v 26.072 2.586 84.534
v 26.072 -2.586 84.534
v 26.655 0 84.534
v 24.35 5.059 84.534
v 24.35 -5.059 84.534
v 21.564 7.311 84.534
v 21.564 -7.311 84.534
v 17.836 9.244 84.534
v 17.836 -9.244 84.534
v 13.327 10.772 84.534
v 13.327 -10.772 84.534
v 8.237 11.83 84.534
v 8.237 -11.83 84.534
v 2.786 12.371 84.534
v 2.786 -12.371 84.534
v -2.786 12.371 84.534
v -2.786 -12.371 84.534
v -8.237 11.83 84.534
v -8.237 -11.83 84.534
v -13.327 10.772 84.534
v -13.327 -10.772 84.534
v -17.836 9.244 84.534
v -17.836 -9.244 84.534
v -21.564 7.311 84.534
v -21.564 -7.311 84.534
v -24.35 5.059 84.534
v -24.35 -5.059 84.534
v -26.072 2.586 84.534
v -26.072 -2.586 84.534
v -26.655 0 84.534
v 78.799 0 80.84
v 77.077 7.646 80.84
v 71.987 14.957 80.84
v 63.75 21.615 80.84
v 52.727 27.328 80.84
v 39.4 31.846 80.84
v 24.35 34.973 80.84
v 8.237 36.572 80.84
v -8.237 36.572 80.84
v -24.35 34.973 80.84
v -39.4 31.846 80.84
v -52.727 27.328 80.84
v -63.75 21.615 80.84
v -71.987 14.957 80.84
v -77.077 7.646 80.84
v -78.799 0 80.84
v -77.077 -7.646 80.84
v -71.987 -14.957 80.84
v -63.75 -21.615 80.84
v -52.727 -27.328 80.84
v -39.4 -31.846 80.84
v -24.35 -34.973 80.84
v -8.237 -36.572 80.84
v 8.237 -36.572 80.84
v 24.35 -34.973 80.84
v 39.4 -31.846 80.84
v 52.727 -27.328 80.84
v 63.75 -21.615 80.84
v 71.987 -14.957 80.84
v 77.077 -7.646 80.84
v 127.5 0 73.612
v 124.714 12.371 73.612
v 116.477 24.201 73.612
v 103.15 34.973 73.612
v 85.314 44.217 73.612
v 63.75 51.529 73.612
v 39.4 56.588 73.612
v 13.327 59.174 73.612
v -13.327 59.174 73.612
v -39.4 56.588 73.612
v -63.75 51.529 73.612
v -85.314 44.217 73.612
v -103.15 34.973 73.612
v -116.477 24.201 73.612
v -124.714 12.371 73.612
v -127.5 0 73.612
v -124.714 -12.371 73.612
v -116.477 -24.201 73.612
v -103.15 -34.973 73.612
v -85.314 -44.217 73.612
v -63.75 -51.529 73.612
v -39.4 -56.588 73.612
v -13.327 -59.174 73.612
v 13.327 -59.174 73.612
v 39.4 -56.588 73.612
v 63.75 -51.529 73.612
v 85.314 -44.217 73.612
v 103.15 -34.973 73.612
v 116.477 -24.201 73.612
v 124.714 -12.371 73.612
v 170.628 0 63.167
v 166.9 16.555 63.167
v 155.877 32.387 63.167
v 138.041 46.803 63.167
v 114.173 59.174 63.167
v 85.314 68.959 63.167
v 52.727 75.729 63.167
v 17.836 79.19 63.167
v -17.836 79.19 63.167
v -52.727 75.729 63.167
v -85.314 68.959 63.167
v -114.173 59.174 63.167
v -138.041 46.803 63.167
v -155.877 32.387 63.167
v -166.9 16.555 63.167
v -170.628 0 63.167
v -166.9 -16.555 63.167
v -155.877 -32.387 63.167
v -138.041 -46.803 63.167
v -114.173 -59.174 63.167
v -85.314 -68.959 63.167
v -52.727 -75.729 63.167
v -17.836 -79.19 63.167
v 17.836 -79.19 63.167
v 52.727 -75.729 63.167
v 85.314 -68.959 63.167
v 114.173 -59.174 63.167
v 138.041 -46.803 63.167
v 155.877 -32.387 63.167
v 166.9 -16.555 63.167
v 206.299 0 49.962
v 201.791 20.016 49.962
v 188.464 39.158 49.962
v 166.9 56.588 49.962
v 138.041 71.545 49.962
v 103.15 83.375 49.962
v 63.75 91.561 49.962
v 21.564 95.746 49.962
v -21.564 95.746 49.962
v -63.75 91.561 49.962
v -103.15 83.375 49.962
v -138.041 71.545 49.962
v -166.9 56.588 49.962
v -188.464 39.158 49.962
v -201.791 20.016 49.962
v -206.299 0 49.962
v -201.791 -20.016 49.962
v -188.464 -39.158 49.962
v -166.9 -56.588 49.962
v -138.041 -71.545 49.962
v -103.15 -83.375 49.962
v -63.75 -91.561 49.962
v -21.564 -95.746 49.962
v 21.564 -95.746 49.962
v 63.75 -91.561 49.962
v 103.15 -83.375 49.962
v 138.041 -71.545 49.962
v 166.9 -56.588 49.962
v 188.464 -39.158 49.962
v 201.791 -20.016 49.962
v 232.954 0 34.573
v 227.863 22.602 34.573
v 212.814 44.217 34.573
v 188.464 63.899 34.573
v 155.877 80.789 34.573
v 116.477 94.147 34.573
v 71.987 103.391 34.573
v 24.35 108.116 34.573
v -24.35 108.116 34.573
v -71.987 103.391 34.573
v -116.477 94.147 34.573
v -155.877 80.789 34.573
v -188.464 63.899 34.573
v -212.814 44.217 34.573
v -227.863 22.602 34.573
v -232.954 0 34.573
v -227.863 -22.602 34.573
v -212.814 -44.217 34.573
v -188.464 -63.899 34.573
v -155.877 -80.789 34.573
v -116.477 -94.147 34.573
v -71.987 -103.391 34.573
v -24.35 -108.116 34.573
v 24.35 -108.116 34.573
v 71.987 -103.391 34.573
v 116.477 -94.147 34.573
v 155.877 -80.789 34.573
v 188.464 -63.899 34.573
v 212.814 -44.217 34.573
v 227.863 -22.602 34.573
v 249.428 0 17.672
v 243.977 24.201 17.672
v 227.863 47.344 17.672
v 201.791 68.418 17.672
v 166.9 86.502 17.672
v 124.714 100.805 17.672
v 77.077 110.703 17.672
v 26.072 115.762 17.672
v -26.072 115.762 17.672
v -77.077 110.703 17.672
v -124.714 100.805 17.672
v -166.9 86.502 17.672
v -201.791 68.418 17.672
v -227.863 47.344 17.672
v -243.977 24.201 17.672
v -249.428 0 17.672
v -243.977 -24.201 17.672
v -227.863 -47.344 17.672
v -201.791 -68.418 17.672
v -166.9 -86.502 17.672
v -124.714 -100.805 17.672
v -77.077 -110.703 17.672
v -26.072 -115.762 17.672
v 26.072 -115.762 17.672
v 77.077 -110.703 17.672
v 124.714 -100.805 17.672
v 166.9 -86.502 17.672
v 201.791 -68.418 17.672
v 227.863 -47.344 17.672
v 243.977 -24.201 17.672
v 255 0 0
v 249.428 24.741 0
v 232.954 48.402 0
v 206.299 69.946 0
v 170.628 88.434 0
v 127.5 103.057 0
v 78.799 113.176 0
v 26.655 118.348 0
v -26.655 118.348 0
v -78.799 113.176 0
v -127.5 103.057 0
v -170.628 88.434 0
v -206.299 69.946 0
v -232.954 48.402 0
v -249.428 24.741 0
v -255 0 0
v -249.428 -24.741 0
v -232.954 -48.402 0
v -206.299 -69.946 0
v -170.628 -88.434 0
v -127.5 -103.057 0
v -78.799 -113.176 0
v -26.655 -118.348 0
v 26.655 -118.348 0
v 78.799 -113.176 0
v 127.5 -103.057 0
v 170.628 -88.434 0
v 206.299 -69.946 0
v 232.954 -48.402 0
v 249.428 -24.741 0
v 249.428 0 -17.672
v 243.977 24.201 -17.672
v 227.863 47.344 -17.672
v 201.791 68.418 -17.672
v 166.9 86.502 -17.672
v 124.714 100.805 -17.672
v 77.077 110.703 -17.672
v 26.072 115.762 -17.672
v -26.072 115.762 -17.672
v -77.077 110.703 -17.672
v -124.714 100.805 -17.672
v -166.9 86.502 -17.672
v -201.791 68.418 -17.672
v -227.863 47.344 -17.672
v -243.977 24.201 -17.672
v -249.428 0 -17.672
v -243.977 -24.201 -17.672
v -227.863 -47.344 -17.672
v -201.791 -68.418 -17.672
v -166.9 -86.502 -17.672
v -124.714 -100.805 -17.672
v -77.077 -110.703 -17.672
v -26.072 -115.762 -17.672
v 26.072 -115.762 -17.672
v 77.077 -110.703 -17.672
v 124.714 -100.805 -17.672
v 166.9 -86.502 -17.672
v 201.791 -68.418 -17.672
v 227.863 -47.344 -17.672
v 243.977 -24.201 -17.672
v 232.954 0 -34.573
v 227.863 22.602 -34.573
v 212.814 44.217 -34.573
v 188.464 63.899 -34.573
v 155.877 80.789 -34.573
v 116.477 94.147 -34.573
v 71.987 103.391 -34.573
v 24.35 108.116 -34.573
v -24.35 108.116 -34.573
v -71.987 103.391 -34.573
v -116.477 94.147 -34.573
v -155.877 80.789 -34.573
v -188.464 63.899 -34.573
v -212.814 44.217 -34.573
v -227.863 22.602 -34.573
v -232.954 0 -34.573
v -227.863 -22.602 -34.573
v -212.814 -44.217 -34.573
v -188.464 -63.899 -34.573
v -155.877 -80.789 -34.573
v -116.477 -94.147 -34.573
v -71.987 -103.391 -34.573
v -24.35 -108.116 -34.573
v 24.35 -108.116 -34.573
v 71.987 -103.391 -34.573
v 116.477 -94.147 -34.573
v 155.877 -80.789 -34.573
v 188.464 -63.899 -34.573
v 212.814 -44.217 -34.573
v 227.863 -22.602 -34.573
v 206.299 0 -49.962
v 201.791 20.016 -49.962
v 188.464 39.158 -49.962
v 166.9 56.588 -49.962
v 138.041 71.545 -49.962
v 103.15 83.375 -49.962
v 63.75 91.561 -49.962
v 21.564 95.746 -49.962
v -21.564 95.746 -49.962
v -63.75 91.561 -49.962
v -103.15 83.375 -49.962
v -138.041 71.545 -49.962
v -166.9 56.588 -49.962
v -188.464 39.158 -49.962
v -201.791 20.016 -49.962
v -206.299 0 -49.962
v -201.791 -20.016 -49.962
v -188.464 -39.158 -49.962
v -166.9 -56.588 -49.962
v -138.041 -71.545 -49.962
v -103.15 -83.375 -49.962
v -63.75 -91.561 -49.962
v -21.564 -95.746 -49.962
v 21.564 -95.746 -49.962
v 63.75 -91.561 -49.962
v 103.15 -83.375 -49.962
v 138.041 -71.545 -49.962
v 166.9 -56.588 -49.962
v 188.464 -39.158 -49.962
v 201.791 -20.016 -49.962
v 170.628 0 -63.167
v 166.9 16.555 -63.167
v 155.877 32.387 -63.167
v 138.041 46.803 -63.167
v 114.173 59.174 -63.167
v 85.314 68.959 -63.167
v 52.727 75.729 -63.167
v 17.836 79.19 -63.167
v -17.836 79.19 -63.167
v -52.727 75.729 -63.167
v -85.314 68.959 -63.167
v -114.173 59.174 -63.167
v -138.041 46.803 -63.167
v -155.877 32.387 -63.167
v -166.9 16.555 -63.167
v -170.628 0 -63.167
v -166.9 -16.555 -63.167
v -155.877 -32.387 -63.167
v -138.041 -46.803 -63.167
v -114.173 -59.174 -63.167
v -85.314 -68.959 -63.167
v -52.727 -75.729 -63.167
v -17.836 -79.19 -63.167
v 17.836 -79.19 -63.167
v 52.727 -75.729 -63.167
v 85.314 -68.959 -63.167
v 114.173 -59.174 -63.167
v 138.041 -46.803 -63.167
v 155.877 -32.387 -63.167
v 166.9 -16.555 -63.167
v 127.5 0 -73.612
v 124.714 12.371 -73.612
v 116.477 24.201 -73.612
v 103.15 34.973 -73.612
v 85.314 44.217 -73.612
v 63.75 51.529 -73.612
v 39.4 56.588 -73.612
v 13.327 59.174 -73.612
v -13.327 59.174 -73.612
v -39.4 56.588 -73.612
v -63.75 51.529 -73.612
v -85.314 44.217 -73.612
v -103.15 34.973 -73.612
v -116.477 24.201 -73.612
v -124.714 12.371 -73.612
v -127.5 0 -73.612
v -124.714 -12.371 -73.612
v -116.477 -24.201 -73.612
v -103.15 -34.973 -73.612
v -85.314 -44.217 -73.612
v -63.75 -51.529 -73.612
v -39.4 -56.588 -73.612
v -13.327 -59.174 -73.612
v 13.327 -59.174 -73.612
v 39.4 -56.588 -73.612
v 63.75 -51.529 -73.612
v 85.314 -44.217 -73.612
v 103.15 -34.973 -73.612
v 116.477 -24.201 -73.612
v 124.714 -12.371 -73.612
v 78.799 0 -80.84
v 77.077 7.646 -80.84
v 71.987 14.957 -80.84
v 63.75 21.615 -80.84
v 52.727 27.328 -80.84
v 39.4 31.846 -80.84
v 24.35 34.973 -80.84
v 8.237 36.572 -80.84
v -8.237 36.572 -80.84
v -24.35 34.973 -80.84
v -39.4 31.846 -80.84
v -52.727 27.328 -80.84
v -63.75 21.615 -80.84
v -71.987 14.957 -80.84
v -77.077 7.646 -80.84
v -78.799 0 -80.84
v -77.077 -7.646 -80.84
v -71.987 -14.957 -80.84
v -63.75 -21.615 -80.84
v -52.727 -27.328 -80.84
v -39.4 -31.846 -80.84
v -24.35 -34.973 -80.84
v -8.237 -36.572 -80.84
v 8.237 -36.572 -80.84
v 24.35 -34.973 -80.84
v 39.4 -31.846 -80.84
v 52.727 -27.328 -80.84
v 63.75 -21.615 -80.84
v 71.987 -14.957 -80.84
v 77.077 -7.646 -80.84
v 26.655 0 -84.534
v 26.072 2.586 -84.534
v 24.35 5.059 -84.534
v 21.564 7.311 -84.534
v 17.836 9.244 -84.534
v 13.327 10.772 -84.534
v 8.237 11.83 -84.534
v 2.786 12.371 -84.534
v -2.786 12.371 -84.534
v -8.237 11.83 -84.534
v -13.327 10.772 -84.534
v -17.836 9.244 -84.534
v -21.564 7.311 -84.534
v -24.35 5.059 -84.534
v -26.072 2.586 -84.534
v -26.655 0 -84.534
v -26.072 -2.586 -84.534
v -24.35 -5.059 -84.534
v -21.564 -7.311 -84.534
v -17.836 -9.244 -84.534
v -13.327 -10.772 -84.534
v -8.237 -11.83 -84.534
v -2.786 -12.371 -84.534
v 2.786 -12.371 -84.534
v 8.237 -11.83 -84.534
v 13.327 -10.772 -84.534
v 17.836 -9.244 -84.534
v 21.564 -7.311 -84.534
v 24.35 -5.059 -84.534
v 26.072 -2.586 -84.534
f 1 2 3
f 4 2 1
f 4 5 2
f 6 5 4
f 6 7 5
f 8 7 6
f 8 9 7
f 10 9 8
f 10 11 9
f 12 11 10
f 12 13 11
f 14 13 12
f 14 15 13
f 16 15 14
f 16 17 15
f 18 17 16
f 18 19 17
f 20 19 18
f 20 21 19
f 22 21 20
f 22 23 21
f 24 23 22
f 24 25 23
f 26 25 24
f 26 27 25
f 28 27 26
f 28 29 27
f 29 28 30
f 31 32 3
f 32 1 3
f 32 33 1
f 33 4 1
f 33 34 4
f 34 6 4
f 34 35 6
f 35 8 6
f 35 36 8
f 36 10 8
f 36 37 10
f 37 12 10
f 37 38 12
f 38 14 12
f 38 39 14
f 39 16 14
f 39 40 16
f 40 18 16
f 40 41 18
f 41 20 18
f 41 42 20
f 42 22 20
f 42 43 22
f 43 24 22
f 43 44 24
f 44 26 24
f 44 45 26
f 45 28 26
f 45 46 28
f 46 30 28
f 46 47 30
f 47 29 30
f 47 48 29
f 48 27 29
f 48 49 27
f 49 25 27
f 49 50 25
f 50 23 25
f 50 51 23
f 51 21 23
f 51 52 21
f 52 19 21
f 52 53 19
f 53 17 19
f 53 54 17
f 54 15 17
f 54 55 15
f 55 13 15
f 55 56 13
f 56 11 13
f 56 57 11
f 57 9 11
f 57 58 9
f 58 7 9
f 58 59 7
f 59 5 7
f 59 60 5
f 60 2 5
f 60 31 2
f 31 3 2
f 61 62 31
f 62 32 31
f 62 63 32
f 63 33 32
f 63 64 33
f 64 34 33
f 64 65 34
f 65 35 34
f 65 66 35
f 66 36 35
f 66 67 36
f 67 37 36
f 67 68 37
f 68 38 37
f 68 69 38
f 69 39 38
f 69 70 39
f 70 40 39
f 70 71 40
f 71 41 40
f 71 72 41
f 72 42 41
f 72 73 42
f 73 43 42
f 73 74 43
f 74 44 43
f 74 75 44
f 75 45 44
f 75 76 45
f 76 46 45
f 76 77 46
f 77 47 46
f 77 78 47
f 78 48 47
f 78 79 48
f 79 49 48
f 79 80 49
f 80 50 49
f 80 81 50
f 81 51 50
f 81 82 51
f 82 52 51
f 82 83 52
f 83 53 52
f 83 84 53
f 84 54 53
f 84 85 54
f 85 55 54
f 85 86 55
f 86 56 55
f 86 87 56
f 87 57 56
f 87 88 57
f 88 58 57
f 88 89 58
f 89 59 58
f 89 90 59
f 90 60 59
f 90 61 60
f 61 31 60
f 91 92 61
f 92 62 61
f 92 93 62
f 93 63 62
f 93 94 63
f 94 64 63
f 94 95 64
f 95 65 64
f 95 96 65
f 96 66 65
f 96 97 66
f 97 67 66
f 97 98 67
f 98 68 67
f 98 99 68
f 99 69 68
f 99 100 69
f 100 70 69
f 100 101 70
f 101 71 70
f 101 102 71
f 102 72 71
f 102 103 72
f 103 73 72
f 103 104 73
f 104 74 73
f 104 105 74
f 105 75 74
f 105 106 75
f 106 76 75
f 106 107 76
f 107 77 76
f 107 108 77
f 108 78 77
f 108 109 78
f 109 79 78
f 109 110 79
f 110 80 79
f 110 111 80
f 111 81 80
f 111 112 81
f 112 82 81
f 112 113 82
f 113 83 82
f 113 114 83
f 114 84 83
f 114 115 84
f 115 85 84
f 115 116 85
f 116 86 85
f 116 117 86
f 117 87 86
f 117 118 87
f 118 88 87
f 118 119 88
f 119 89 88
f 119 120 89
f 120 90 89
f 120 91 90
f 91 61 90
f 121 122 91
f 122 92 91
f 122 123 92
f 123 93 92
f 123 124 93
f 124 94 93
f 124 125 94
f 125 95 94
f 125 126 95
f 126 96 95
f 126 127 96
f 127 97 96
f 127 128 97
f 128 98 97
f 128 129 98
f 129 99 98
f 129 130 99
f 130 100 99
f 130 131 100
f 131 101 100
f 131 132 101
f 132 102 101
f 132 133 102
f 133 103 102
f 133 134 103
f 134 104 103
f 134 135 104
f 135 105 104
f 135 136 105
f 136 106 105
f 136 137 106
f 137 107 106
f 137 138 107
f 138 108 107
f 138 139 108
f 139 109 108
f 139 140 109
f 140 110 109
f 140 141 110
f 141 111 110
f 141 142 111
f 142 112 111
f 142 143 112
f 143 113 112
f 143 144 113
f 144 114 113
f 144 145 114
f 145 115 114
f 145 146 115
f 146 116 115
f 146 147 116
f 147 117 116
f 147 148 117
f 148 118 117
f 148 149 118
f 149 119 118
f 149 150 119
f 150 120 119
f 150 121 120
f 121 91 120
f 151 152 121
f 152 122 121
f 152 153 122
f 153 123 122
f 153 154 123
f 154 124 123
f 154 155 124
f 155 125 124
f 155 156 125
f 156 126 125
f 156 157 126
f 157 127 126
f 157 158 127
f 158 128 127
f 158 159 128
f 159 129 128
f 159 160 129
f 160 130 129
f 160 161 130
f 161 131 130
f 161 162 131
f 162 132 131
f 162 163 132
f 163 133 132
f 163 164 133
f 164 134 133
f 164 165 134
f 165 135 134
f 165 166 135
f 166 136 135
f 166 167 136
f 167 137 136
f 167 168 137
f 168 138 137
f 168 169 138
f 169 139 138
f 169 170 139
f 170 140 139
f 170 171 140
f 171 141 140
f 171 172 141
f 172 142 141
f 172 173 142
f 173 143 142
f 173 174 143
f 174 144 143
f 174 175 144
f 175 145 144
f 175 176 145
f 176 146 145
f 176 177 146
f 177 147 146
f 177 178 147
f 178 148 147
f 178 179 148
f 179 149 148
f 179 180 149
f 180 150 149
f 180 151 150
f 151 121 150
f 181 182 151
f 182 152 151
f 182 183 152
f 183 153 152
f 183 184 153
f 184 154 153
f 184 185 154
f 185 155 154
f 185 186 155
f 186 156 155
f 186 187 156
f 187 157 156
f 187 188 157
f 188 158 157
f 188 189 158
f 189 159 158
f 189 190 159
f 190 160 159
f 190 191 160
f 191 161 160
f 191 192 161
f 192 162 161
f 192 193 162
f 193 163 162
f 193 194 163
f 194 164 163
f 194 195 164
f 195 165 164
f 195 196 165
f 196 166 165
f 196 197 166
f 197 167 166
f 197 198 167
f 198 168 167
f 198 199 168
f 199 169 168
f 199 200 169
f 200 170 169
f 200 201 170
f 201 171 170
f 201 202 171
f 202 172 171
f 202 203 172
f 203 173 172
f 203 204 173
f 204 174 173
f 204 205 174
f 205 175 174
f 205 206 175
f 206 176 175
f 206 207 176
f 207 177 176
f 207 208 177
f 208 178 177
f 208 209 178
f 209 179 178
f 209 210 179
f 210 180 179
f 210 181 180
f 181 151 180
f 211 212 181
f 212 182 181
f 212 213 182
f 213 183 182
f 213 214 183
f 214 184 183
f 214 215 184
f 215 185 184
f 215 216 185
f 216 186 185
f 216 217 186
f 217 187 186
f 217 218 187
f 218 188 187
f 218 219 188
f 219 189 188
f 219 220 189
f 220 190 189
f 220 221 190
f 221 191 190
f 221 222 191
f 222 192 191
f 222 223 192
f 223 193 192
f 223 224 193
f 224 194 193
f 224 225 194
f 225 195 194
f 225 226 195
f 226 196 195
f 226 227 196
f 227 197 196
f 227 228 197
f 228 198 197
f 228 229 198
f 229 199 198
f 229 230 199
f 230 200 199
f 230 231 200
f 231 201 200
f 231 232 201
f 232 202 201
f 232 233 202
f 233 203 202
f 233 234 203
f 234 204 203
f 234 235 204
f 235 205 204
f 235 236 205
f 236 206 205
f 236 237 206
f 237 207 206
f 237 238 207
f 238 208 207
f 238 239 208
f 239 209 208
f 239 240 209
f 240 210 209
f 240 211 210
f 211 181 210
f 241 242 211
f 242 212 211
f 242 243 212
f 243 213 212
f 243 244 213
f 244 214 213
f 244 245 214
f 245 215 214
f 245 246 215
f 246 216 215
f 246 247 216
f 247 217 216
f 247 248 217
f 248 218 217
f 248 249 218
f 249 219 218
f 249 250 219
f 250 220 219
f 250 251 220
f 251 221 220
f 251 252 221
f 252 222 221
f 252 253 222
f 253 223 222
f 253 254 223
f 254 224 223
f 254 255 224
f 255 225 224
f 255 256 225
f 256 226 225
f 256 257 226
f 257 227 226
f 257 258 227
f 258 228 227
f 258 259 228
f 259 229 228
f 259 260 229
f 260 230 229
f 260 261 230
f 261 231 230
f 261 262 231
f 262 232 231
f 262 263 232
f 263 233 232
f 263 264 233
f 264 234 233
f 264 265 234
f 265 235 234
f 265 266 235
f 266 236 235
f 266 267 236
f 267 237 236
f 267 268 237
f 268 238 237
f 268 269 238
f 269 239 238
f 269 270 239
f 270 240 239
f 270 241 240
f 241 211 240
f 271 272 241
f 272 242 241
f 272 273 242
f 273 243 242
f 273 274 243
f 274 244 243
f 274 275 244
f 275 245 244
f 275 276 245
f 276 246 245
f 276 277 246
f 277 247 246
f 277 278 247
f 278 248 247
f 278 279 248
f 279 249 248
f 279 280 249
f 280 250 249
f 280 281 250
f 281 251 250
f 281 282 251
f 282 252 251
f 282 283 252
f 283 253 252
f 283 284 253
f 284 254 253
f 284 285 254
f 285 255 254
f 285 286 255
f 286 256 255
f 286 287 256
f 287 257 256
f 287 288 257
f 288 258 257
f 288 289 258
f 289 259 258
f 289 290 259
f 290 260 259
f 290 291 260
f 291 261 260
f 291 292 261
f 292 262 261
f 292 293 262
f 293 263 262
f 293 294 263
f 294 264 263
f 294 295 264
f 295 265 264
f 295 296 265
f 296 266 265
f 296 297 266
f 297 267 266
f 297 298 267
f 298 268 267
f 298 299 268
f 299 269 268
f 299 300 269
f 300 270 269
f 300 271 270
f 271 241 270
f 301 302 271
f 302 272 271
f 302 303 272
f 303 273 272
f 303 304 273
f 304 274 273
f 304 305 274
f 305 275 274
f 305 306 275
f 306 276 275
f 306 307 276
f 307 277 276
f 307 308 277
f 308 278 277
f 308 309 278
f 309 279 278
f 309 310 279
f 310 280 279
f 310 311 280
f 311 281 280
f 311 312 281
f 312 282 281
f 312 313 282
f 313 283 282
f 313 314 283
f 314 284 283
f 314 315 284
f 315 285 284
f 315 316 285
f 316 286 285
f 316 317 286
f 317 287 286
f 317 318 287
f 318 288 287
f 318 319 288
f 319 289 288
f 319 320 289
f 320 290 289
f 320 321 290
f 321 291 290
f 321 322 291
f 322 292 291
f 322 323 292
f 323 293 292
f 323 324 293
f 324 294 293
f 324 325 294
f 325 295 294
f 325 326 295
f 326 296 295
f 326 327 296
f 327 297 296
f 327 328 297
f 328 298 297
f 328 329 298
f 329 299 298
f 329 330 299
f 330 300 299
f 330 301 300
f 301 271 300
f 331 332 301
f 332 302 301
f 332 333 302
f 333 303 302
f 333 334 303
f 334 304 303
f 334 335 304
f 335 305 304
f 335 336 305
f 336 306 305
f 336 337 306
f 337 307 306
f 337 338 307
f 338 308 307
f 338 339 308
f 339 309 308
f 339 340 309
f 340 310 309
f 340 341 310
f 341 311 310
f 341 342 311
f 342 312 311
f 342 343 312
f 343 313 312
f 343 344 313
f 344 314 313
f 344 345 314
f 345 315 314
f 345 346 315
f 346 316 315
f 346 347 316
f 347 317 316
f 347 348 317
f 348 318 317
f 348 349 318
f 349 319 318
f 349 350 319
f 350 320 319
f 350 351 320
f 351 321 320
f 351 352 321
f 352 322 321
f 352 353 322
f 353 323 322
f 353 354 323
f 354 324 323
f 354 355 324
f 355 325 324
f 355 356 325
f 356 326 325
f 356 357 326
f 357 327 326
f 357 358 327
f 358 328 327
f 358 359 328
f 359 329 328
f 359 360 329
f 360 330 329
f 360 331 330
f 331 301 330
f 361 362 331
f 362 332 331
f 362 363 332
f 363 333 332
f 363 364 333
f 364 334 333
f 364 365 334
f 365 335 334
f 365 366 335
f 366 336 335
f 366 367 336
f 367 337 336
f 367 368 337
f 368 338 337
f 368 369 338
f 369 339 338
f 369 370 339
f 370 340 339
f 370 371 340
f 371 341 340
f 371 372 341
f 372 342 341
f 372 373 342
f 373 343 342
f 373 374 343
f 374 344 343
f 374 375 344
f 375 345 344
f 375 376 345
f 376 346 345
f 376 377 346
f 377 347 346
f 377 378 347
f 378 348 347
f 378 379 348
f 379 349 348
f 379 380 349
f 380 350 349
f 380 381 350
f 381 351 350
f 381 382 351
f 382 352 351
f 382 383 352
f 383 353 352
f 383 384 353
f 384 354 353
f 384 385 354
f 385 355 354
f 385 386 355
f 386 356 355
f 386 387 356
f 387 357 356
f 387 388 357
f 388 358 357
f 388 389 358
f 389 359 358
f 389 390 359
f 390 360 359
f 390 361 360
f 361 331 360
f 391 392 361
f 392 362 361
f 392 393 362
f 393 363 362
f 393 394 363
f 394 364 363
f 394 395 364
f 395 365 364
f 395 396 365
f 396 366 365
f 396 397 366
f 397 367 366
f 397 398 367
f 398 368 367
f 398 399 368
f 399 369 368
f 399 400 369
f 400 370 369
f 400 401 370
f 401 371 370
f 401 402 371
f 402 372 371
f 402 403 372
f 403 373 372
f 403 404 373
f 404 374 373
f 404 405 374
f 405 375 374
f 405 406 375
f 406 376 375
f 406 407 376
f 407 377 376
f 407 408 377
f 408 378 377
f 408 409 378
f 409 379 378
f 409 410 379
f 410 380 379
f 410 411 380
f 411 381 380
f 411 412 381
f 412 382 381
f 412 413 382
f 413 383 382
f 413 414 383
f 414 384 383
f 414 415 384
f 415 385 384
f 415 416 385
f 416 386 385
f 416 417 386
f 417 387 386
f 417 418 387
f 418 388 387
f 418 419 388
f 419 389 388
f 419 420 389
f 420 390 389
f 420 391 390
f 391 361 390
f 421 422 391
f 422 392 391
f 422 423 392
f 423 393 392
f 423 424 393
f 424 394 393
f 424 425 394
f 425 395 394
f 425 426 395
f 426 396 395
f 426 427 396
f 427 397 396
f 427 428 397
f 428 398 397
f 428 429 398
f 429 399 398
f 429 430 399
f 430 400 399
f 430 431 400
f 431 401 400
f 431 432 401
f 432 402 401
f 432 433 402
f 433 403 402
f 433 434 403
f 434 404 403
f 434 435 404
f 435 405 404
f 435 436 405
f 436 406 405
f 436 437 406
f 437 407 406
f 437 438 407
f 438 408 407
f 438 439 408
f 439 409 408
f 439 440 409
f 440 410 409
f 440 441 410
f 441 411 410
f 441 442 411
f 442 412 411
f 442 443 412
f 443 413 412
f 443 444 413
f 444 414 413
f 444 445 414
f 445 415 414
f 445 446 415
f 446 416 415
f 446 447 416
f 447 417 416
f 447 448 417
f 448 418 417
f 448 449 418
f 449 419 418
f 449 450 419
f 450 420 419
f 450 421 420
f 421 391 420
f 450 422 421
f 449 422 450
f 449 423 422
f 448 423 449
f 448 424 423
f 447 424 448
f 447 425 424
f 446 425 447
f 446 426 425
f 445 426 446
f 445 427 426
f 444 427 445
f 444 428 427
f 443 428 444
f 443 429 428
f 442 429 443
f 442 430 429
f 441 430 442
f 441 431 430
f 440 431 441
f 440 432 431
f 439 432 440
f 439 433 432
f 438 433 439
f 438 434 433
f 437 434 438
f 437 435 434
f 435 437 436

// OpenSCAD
// Generated by SolidPython 1.0.1 on 2020-07-29 00:46:51


scale(v = [15, 7, 5]) {
	sphere(r = 17);
}
/***********************************************
*********      SolidPython code:      **********
************************************************
 
# import packages: SolidPython
from solid import *
from solid.utils import *
from itertools import chain, combinations, permutations


class Resize:

    def __init__(self, scad_file):
        self.scad_file = scad_file
        #self.scad_file = import_scad(scad_file)
        # cone/cylinder param:
        self.r1 = 0
        self.r2 = 0
        self.h = 0
        # rectangular prism param:
        self.w = 0
        self.l = 0
        # ellipse param:
        self.r = 0

    # import OpenScad code (file name corresponds to shape)


    # classify shape + parameters
    def assign(self, param1, param2, param3):
        if self.scad_file == 'cone.scad':
            self.r1 = param1
            self.r2 = param2
            self.h = param3
        elif self.scad_file == 'cylinder.scad':
            self.r1 = param1
            self.r2 = param2
            self.h = param3
        elif self.scad_file == 'rectangularPrism.scad':
            self.h = param1
            self.l = param2
            self.w = param3
        else:
            self.r = param1
            self.h = param2

    # resize parameters
    def iterate(self):
        x = range(3, 20, 2)
        i = 1
        if self.scad_file == 'cone.scad':
            tempList = list(permutations(x, 2))
            for temp in tempList:
                param1 = temp[0]
                param2 = temp[1]
                filepath = 'produced_scad_files/' + 'cone' + str(param1) + '_' + str(param2) + '_' + '.scad'
                scad_render_to_file(cylinder(h=param1, r1=param2, r2=0), filepath)

        elif self.scad_file == 'cylinder.scad':
            tempList = list(permutations(x, 3))
            for temp in tempList:
                param1 = temp[0]
                param2 = temp[1]
                filepath = 'produced_scad_files/' + 'cylinder' + str(param1) + '_' + str(param2) + '_' + '.scad'
                scad_render_to_file(cylinder(h=param1, r1=param2, r2=param2), filepath)

        elif self.scad_file == 'rectangularPrism.scad':
            tempList = list(permutations(x, 3))
            for temp in tempList:
                param1 = temp[0]
                param2 = temp[1]
                param3 = temp[2]
                filepath = 'produced_scad_files/' + 'rectangularPrism' + str(param1) + '_' + str(param2) + '_' + str(
                    param3) + '.scad'
                scad_render_to_file(cube(size=(param1, param2, param3)), filepath)

        elif self.scad_file == 'ellipse.scad':
            tempList = list(permutations(x, 4))
            for temp in tempList:
                param1 = temp[0]
                param2 = temp[1]
                param3 = temp[2]
                param4 = temp[3]
                filepath = 'produced_scad_files/' + 'ellipse' + str(param1) + '_' + str(param2) + '_' + str(param3) + '_' + str(param4) + '.scad'
                scad_render_to_file(scale([param1, param2, param3])(sphere(r=param4)), filepath)

    def render_to_scadfile(self):
        scad_render_to_file(scad, 'example.scad') 
 
************************************************/
